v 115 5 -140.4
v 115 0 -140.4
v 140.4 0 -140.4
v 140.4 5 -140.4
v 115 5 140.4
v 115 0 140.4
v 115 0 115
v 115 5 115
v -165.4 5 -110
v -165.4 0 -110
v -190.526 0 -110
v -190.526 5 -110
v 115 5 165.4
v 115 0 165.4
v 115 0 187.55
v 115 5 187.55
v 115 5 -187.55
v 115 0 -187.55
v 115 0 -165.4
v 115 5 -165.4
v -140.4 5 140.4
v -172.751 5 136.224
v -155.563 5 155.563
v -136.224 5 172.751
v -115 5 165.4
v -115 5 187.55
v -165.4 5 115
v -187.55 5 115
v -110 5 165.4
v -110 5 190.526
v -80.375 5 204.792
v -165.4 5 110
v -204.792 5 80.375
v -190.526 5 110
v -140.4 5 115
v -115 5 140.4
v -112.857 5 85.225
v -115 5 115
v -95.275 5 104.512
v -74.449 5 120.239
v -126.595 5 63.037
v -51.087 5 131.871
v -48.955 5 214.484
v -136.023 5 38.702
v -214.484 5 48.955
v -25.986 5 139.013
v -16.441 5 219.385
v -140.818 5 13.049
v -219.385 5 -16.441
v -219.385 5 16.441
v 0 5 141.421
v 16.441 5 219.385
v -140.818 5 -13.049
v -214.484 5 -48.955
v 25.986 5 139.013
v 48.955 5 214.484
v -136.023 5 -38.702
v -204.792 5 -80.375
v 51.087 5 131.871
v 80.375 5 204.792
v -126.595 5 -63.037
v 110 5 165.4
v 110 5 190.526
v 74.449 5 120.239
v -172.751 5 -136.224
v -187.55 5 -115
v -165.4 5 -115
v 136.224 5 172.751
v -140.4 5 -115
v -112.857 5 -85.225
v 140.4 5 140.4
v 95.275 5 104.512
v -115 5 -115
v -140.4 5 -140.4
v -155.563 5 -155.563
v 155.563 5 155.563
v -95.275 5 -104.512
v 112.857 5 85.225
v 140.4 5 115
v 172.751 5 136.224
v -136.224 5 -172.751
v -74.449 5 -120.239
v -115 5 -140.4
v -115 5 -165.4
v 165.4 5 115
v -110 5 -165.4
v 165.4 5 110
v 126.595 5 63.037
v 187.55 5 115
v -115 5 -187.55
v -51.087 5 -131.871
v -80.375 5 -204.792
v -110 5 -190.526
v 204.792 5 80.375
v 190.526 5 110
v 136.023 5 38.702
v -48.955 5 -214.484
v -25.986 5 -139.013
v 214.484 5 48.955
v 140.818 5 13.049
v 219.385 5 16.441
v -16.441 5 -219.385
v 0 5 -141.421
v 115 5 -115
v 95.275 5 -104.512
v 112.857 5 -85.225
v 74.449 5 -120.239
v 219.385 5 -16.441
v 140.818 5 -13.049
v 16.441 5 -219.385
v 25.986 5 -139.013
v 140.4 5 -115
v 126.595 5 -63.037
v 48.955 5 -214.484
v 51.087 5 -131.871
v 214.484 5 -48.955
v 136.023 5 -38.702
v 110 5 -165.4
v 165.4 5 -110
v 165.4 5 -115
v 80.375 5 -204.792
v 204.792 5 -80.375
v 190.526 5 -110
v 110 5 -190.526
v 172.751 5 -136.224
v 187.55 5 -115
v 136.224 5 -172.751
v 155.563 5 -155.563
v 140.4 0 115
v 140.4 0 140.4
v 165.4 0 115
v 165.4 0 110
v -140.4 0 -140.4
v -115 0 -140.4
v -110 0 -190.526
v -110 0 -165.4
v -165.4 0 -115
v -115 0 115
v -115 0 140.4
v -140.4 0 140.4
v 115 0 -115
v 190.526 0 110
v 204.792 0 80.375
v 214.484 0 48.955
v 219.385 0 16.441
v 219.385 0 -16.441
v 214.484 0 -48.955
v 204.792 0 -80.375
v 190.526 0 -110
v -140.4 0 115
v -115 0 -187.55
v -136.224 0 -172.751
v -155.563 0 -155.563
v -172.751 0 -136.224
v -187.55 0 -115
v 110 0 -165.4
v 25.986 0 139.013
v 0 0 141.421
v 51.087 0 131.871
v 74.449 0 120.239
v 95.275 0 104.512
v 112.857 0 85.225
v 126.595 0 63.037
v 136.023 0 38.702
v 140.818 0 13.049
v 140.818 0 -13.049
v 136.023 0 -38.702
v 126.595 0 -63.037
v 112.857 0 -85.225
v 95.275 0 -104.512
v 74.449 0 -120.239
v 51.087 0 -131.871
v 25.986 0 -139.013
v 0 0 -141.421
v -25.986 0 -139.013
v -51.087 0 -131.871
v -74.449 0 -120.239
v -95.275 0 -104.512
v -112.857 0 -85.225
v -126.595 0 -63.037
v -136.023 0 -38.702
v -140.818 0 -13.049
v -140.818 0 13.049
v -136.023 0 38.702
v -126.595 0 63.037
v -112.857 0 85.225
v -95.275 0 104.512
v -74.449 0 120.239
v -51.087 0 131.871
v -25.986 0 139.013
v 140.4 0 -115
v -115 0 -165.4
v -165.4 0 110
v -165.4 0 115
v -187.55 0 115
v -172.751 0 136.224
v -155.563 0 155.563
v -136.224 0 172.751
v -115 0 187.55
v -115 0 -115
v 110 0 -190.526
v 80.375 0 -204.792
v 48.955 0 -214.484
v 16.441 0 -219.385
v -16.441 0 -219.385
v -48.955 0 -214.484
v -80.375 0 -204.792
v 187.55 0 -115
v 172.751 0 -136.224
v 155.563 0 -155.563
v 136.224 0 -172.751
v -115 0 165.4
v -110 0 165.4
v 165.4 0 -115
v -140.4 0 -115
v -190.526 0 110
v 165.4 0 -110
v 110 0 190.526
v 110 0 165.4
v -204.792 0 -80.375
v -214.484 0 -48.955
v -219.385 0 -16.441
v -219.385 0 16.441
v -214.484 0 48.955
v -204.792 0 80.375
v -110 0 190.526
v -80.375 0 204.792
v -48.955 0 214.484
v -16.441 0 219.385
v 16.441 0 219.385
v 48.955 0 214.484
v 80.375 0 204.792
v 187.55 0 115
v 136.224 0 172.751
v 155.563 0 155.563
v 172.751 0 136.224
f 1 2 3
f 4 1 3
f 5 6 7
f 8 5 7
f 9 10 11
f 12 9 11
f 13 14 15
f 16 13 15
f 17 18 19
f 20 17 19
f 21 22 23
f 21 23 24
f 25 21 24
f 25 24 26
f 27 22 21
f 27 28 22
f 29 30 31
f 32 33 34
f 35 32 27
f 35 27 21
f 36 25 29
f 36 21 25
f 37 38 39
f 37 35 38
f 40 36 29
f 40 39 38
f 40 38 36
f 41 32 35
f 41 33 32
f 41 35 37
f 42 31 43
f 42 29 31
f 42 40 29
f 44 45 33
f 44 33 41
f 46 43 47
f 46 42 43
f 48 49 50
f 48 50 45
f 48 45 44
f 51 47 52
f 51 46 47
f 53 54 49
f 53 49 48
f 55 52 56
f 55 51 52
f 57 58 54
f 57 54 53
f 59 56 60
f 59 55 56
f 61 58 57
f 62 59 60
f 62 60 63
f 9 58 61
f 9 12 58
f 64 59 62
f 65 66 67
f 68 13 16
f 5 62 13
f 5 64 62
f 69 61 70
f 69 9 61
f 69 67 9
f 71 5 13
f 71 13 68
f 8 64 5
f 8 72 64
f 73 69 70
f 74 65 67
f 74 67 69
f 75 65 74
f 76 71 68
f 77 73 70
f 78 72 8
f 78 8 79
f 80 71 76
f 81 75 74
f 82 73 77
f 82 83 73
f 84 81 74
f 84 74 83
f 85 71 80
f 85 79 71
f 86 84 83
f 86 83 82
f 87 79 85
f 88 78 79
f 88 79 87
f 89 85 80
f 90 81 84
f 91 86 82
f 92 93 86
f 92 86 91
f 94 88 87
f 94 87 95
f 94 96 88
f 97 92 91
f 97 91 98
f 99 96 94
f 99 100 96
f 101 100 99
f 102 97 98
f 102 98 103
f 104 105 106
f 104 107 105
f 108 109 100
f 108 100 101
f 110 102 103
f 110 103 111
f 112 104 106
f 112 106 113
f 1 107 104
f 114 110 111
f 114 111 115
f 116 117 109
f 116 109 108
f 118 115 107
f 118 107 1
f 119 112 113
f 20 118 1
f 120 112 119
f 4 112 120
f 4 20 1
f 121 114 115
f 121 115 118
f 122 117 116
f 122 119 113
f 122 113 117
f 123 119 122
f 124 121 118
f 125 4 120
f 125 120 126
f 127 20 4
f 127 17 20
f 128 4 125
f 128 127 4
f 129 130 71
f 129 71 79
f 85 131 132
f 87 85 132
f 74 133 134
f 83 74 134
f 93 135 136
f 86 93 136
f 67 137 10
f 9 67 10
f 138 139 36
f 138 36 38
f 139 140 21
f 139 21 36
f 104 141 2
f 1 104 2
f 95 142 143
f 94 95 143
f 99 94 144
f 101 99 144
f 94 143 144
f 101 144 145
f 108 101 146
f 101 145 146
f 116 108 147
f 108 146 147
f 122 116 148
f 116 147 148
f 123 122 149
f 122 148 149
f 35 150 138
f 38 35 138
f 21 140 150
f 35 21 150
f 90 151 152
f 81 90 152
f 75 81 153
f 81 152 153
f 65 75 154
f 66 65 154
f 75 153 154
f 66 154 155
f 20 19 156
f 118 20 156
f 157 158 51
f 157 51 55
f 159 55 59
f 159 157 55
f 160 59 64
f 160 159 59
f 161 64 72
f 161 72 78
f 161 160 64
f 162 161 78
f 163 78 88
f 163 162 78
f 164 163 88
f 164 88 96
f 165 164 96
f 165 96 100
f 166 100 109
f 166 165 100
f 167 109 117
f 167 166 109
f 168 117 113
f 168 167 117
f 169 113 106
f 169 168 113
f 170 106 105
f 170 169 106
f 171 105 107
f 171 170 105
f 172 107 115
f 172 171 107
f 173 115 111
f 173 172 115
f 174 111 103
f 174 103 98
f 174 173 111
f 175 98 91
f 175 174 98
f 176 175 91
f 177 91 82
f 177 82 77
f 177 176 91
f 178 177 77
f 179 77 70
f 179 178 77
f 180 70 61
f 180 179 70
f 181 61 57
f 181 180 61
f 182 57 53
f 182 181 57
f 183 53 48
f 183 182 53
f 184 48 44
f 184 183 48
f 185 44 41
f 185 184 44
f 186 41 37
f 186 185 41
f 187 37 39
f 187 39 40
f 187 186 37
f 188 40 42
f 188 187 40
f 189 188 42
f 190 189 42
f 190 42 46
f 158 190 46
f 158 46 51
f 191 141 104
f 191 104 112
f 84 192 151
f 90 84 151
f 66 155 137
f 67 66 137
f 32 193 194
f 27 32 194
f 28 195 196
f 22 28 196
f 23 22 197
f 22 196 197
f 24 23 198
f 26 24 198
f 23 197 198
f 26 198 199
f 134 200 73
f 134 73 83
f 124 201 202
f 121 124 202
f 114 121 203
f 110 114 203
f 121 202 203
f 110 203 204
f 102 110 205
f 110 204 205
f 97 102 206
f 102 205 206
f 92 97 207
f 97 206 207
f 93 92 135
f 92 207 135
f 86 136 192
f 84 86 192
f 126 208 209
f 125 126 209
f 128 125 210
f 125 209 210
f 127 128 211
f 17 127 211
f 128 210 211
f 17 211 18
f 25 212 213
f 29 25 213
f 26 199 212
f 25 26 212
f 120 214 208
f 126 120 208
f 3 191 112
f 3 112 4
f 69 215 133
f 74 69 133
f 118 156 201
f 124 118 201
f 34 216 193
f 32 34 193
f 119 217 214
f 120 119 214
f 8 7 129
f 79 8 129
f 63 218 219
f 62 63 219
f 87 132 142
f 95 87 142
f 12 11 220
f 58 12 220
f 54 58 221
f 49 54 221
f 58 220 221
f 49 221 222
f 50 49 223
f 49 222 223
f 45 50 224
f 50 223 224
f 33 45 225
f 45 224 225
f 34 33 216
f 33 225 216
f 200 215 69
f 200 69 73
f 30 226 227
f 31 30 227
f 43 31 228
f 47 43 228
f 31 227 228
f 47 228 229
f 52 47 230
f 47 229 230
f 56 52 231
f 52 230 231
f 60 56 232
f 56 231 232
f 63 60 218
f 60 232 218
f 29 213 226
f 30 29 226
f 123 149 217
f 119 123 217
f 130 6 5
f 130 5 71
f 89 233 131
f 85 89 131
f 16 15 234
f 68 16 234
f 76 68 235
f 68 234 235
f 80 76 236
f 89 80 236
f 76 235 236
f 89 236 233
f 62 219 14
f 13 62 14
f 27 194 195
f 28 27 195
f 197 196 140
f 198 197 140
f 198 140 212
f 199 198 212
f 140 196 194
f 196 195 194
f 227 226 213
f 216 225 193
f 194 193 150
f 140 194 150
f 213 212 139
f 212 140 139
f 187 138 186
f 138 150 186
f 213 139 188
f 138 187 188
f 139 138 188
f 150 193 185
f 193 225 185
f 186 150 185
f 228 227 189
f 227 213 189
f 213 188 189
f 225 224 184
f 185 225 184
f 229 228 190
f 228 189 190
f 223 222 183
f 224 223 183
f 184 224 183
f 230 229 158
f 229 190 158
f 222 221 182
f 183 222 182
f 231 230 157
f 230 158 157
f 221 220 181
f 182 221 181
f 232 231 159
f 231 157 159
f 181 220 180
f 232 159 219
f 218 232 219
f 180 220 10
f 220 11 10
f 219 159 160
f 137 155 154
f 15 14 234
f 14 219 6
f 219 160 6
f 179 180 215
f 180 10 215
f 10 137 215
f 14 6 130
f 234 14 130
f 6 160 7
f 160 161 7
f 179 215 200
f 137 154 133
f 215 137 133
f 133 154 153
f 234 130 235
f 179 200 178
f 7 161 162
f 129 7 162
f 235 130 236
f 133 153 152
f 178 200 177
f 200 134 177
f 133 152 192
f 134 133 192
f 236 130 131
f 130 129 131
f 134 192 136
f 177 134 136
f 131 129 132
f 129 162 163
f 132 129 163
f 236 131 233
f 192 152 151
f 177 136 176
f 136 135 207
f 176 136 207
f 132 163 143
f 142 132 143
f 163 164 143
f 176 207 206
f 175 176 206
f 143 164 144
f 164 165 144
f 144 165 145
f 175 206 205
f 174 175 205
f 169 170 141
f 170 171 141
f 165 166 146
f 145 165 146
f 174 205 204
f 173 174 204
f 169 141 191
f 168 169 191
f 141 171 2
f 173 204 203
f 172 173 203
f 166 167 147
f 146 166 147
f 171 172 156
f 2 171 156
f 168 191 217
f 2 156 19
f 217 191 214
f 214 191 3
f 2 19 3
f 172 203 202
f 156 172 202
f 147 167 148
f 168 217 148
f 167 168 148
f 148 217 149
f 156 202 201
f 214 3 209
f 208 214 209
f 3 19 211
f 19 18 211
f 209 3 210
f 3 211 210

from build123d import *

# Parameters (mm, degrees)
SKETCH1_R           = 141.421356237
SKETCH1_W           = 25.4
SKETCH1_H           = 25.4
BOSS_EXTRUDE1_DEPTH = 5


with BuildPart() as part:
    # Sketch1 → Boss-Extrude1 (new body)
    with BuildSketch(Plane(origin=(0, 0, 0), x_dir=(1, 0, 0), z_dir=(0, 1, 0))):
        with BuildLine():
            Line((115, 165.4), (110, 165.4))
            Line((110, 165.4), (110, 190.525588833))
            ThreePointArc((110, 190.525588833), (0, 220), (-110, 190.525588833))
            Line((-110, 190.525588833), (-110, 165.4))
            Line((-110, 165.4), (-115, 165.4))
            Line((-115, 165.4), (-115, 187.549993335))
            ThreePointArc((-115, 187.549993335), (-155.563491861, 155.563491861), (-187.549993335, 115))
            Line((-187.549993335, 115), (-165.4, 115))
            Line((-165.4, 115), (-165.4, 110))
            Line((-165.4, 110), (-190.525588833, 110))
            ThreePointArc((-190.525588833, 110), (-220, 0), (-190.525588833, -110))
            Line((-190.525588833, -110), (-165.4, -110))
            Line((-165.4, -110), (-165.4, -115))
            Line((-165.4, -115), (-187.549993335, -115))
            ThreePointArc((-187.549993335, -115), (-155.563491861, -155.563491861), (-115, -187.549993335))
            Line((-115, -187.549993335), (-115, -165.4))
            Line((-115, -165.4), (-110, -165.4))
            Line((-110, -165.4), (-110, -190.525588833))
            ThreePointArc((-110, -190.525588833), (0, -220), (110, -190.525588833))
            Line((110, -190.525588833), (110, -165.4))
            Line((110, -165.4), (115, -165.4))
            Line((115, -165.4), (115, -187.549993335))
            ThreePointArc((115, -187.549993335), (155.563491861, -155.563491861), (187.549993335, -115))
            Line((187.549993335, -115), (165.4, -115))
            Line((165.4, -115), (165.4, -110))
            Line((165.4, -110), (190.525588833, -110))
            ThreePointArc((190.525588833, -110), (220, 0), (190.525588833, 110))
            Line((190.525588833, 110), (165.4, 110))
            Line((165.4, 110), (165.4, 115))
            Line((165.4, 115), (187.549993335, 115))
            ThreePointArc((187.549993335, 115), (155.563491861, 155.563491861), (115, 187.549993335))
            Line((115, 187.549993335), (115, 165.4))
        make_face()
        with Locations(Location((0, 0, 0), (0, 0, 270))):
            Circle(SKETCH1_R, mode=Mode.SUBTRACT)
        with Locations((127.7, 127.7)):
            Rectangle(SKETCH1_W, SKETCH1_H, mode=Mode.SUBTRACT)
        with Locations((-127.7, 127.7)):
            Rectangle(SKETCH1_W, SKETCH1_H, mode=Mode.SUBTRACT)
        with Locations((127.7, -127.7)):
            Rectangle(SKETCH1_W, SKETCH1_H, mode=Mode.SUBTRACT)
        with Locations((-127.7, -127.7)):
            Rectangle(SKETCH1_W, SKETCH1_H, mode=Mode.SUBTRACT)
    extrude(amount=BOSS_EXTRUDE1_DEPTH)


solid = part.part
